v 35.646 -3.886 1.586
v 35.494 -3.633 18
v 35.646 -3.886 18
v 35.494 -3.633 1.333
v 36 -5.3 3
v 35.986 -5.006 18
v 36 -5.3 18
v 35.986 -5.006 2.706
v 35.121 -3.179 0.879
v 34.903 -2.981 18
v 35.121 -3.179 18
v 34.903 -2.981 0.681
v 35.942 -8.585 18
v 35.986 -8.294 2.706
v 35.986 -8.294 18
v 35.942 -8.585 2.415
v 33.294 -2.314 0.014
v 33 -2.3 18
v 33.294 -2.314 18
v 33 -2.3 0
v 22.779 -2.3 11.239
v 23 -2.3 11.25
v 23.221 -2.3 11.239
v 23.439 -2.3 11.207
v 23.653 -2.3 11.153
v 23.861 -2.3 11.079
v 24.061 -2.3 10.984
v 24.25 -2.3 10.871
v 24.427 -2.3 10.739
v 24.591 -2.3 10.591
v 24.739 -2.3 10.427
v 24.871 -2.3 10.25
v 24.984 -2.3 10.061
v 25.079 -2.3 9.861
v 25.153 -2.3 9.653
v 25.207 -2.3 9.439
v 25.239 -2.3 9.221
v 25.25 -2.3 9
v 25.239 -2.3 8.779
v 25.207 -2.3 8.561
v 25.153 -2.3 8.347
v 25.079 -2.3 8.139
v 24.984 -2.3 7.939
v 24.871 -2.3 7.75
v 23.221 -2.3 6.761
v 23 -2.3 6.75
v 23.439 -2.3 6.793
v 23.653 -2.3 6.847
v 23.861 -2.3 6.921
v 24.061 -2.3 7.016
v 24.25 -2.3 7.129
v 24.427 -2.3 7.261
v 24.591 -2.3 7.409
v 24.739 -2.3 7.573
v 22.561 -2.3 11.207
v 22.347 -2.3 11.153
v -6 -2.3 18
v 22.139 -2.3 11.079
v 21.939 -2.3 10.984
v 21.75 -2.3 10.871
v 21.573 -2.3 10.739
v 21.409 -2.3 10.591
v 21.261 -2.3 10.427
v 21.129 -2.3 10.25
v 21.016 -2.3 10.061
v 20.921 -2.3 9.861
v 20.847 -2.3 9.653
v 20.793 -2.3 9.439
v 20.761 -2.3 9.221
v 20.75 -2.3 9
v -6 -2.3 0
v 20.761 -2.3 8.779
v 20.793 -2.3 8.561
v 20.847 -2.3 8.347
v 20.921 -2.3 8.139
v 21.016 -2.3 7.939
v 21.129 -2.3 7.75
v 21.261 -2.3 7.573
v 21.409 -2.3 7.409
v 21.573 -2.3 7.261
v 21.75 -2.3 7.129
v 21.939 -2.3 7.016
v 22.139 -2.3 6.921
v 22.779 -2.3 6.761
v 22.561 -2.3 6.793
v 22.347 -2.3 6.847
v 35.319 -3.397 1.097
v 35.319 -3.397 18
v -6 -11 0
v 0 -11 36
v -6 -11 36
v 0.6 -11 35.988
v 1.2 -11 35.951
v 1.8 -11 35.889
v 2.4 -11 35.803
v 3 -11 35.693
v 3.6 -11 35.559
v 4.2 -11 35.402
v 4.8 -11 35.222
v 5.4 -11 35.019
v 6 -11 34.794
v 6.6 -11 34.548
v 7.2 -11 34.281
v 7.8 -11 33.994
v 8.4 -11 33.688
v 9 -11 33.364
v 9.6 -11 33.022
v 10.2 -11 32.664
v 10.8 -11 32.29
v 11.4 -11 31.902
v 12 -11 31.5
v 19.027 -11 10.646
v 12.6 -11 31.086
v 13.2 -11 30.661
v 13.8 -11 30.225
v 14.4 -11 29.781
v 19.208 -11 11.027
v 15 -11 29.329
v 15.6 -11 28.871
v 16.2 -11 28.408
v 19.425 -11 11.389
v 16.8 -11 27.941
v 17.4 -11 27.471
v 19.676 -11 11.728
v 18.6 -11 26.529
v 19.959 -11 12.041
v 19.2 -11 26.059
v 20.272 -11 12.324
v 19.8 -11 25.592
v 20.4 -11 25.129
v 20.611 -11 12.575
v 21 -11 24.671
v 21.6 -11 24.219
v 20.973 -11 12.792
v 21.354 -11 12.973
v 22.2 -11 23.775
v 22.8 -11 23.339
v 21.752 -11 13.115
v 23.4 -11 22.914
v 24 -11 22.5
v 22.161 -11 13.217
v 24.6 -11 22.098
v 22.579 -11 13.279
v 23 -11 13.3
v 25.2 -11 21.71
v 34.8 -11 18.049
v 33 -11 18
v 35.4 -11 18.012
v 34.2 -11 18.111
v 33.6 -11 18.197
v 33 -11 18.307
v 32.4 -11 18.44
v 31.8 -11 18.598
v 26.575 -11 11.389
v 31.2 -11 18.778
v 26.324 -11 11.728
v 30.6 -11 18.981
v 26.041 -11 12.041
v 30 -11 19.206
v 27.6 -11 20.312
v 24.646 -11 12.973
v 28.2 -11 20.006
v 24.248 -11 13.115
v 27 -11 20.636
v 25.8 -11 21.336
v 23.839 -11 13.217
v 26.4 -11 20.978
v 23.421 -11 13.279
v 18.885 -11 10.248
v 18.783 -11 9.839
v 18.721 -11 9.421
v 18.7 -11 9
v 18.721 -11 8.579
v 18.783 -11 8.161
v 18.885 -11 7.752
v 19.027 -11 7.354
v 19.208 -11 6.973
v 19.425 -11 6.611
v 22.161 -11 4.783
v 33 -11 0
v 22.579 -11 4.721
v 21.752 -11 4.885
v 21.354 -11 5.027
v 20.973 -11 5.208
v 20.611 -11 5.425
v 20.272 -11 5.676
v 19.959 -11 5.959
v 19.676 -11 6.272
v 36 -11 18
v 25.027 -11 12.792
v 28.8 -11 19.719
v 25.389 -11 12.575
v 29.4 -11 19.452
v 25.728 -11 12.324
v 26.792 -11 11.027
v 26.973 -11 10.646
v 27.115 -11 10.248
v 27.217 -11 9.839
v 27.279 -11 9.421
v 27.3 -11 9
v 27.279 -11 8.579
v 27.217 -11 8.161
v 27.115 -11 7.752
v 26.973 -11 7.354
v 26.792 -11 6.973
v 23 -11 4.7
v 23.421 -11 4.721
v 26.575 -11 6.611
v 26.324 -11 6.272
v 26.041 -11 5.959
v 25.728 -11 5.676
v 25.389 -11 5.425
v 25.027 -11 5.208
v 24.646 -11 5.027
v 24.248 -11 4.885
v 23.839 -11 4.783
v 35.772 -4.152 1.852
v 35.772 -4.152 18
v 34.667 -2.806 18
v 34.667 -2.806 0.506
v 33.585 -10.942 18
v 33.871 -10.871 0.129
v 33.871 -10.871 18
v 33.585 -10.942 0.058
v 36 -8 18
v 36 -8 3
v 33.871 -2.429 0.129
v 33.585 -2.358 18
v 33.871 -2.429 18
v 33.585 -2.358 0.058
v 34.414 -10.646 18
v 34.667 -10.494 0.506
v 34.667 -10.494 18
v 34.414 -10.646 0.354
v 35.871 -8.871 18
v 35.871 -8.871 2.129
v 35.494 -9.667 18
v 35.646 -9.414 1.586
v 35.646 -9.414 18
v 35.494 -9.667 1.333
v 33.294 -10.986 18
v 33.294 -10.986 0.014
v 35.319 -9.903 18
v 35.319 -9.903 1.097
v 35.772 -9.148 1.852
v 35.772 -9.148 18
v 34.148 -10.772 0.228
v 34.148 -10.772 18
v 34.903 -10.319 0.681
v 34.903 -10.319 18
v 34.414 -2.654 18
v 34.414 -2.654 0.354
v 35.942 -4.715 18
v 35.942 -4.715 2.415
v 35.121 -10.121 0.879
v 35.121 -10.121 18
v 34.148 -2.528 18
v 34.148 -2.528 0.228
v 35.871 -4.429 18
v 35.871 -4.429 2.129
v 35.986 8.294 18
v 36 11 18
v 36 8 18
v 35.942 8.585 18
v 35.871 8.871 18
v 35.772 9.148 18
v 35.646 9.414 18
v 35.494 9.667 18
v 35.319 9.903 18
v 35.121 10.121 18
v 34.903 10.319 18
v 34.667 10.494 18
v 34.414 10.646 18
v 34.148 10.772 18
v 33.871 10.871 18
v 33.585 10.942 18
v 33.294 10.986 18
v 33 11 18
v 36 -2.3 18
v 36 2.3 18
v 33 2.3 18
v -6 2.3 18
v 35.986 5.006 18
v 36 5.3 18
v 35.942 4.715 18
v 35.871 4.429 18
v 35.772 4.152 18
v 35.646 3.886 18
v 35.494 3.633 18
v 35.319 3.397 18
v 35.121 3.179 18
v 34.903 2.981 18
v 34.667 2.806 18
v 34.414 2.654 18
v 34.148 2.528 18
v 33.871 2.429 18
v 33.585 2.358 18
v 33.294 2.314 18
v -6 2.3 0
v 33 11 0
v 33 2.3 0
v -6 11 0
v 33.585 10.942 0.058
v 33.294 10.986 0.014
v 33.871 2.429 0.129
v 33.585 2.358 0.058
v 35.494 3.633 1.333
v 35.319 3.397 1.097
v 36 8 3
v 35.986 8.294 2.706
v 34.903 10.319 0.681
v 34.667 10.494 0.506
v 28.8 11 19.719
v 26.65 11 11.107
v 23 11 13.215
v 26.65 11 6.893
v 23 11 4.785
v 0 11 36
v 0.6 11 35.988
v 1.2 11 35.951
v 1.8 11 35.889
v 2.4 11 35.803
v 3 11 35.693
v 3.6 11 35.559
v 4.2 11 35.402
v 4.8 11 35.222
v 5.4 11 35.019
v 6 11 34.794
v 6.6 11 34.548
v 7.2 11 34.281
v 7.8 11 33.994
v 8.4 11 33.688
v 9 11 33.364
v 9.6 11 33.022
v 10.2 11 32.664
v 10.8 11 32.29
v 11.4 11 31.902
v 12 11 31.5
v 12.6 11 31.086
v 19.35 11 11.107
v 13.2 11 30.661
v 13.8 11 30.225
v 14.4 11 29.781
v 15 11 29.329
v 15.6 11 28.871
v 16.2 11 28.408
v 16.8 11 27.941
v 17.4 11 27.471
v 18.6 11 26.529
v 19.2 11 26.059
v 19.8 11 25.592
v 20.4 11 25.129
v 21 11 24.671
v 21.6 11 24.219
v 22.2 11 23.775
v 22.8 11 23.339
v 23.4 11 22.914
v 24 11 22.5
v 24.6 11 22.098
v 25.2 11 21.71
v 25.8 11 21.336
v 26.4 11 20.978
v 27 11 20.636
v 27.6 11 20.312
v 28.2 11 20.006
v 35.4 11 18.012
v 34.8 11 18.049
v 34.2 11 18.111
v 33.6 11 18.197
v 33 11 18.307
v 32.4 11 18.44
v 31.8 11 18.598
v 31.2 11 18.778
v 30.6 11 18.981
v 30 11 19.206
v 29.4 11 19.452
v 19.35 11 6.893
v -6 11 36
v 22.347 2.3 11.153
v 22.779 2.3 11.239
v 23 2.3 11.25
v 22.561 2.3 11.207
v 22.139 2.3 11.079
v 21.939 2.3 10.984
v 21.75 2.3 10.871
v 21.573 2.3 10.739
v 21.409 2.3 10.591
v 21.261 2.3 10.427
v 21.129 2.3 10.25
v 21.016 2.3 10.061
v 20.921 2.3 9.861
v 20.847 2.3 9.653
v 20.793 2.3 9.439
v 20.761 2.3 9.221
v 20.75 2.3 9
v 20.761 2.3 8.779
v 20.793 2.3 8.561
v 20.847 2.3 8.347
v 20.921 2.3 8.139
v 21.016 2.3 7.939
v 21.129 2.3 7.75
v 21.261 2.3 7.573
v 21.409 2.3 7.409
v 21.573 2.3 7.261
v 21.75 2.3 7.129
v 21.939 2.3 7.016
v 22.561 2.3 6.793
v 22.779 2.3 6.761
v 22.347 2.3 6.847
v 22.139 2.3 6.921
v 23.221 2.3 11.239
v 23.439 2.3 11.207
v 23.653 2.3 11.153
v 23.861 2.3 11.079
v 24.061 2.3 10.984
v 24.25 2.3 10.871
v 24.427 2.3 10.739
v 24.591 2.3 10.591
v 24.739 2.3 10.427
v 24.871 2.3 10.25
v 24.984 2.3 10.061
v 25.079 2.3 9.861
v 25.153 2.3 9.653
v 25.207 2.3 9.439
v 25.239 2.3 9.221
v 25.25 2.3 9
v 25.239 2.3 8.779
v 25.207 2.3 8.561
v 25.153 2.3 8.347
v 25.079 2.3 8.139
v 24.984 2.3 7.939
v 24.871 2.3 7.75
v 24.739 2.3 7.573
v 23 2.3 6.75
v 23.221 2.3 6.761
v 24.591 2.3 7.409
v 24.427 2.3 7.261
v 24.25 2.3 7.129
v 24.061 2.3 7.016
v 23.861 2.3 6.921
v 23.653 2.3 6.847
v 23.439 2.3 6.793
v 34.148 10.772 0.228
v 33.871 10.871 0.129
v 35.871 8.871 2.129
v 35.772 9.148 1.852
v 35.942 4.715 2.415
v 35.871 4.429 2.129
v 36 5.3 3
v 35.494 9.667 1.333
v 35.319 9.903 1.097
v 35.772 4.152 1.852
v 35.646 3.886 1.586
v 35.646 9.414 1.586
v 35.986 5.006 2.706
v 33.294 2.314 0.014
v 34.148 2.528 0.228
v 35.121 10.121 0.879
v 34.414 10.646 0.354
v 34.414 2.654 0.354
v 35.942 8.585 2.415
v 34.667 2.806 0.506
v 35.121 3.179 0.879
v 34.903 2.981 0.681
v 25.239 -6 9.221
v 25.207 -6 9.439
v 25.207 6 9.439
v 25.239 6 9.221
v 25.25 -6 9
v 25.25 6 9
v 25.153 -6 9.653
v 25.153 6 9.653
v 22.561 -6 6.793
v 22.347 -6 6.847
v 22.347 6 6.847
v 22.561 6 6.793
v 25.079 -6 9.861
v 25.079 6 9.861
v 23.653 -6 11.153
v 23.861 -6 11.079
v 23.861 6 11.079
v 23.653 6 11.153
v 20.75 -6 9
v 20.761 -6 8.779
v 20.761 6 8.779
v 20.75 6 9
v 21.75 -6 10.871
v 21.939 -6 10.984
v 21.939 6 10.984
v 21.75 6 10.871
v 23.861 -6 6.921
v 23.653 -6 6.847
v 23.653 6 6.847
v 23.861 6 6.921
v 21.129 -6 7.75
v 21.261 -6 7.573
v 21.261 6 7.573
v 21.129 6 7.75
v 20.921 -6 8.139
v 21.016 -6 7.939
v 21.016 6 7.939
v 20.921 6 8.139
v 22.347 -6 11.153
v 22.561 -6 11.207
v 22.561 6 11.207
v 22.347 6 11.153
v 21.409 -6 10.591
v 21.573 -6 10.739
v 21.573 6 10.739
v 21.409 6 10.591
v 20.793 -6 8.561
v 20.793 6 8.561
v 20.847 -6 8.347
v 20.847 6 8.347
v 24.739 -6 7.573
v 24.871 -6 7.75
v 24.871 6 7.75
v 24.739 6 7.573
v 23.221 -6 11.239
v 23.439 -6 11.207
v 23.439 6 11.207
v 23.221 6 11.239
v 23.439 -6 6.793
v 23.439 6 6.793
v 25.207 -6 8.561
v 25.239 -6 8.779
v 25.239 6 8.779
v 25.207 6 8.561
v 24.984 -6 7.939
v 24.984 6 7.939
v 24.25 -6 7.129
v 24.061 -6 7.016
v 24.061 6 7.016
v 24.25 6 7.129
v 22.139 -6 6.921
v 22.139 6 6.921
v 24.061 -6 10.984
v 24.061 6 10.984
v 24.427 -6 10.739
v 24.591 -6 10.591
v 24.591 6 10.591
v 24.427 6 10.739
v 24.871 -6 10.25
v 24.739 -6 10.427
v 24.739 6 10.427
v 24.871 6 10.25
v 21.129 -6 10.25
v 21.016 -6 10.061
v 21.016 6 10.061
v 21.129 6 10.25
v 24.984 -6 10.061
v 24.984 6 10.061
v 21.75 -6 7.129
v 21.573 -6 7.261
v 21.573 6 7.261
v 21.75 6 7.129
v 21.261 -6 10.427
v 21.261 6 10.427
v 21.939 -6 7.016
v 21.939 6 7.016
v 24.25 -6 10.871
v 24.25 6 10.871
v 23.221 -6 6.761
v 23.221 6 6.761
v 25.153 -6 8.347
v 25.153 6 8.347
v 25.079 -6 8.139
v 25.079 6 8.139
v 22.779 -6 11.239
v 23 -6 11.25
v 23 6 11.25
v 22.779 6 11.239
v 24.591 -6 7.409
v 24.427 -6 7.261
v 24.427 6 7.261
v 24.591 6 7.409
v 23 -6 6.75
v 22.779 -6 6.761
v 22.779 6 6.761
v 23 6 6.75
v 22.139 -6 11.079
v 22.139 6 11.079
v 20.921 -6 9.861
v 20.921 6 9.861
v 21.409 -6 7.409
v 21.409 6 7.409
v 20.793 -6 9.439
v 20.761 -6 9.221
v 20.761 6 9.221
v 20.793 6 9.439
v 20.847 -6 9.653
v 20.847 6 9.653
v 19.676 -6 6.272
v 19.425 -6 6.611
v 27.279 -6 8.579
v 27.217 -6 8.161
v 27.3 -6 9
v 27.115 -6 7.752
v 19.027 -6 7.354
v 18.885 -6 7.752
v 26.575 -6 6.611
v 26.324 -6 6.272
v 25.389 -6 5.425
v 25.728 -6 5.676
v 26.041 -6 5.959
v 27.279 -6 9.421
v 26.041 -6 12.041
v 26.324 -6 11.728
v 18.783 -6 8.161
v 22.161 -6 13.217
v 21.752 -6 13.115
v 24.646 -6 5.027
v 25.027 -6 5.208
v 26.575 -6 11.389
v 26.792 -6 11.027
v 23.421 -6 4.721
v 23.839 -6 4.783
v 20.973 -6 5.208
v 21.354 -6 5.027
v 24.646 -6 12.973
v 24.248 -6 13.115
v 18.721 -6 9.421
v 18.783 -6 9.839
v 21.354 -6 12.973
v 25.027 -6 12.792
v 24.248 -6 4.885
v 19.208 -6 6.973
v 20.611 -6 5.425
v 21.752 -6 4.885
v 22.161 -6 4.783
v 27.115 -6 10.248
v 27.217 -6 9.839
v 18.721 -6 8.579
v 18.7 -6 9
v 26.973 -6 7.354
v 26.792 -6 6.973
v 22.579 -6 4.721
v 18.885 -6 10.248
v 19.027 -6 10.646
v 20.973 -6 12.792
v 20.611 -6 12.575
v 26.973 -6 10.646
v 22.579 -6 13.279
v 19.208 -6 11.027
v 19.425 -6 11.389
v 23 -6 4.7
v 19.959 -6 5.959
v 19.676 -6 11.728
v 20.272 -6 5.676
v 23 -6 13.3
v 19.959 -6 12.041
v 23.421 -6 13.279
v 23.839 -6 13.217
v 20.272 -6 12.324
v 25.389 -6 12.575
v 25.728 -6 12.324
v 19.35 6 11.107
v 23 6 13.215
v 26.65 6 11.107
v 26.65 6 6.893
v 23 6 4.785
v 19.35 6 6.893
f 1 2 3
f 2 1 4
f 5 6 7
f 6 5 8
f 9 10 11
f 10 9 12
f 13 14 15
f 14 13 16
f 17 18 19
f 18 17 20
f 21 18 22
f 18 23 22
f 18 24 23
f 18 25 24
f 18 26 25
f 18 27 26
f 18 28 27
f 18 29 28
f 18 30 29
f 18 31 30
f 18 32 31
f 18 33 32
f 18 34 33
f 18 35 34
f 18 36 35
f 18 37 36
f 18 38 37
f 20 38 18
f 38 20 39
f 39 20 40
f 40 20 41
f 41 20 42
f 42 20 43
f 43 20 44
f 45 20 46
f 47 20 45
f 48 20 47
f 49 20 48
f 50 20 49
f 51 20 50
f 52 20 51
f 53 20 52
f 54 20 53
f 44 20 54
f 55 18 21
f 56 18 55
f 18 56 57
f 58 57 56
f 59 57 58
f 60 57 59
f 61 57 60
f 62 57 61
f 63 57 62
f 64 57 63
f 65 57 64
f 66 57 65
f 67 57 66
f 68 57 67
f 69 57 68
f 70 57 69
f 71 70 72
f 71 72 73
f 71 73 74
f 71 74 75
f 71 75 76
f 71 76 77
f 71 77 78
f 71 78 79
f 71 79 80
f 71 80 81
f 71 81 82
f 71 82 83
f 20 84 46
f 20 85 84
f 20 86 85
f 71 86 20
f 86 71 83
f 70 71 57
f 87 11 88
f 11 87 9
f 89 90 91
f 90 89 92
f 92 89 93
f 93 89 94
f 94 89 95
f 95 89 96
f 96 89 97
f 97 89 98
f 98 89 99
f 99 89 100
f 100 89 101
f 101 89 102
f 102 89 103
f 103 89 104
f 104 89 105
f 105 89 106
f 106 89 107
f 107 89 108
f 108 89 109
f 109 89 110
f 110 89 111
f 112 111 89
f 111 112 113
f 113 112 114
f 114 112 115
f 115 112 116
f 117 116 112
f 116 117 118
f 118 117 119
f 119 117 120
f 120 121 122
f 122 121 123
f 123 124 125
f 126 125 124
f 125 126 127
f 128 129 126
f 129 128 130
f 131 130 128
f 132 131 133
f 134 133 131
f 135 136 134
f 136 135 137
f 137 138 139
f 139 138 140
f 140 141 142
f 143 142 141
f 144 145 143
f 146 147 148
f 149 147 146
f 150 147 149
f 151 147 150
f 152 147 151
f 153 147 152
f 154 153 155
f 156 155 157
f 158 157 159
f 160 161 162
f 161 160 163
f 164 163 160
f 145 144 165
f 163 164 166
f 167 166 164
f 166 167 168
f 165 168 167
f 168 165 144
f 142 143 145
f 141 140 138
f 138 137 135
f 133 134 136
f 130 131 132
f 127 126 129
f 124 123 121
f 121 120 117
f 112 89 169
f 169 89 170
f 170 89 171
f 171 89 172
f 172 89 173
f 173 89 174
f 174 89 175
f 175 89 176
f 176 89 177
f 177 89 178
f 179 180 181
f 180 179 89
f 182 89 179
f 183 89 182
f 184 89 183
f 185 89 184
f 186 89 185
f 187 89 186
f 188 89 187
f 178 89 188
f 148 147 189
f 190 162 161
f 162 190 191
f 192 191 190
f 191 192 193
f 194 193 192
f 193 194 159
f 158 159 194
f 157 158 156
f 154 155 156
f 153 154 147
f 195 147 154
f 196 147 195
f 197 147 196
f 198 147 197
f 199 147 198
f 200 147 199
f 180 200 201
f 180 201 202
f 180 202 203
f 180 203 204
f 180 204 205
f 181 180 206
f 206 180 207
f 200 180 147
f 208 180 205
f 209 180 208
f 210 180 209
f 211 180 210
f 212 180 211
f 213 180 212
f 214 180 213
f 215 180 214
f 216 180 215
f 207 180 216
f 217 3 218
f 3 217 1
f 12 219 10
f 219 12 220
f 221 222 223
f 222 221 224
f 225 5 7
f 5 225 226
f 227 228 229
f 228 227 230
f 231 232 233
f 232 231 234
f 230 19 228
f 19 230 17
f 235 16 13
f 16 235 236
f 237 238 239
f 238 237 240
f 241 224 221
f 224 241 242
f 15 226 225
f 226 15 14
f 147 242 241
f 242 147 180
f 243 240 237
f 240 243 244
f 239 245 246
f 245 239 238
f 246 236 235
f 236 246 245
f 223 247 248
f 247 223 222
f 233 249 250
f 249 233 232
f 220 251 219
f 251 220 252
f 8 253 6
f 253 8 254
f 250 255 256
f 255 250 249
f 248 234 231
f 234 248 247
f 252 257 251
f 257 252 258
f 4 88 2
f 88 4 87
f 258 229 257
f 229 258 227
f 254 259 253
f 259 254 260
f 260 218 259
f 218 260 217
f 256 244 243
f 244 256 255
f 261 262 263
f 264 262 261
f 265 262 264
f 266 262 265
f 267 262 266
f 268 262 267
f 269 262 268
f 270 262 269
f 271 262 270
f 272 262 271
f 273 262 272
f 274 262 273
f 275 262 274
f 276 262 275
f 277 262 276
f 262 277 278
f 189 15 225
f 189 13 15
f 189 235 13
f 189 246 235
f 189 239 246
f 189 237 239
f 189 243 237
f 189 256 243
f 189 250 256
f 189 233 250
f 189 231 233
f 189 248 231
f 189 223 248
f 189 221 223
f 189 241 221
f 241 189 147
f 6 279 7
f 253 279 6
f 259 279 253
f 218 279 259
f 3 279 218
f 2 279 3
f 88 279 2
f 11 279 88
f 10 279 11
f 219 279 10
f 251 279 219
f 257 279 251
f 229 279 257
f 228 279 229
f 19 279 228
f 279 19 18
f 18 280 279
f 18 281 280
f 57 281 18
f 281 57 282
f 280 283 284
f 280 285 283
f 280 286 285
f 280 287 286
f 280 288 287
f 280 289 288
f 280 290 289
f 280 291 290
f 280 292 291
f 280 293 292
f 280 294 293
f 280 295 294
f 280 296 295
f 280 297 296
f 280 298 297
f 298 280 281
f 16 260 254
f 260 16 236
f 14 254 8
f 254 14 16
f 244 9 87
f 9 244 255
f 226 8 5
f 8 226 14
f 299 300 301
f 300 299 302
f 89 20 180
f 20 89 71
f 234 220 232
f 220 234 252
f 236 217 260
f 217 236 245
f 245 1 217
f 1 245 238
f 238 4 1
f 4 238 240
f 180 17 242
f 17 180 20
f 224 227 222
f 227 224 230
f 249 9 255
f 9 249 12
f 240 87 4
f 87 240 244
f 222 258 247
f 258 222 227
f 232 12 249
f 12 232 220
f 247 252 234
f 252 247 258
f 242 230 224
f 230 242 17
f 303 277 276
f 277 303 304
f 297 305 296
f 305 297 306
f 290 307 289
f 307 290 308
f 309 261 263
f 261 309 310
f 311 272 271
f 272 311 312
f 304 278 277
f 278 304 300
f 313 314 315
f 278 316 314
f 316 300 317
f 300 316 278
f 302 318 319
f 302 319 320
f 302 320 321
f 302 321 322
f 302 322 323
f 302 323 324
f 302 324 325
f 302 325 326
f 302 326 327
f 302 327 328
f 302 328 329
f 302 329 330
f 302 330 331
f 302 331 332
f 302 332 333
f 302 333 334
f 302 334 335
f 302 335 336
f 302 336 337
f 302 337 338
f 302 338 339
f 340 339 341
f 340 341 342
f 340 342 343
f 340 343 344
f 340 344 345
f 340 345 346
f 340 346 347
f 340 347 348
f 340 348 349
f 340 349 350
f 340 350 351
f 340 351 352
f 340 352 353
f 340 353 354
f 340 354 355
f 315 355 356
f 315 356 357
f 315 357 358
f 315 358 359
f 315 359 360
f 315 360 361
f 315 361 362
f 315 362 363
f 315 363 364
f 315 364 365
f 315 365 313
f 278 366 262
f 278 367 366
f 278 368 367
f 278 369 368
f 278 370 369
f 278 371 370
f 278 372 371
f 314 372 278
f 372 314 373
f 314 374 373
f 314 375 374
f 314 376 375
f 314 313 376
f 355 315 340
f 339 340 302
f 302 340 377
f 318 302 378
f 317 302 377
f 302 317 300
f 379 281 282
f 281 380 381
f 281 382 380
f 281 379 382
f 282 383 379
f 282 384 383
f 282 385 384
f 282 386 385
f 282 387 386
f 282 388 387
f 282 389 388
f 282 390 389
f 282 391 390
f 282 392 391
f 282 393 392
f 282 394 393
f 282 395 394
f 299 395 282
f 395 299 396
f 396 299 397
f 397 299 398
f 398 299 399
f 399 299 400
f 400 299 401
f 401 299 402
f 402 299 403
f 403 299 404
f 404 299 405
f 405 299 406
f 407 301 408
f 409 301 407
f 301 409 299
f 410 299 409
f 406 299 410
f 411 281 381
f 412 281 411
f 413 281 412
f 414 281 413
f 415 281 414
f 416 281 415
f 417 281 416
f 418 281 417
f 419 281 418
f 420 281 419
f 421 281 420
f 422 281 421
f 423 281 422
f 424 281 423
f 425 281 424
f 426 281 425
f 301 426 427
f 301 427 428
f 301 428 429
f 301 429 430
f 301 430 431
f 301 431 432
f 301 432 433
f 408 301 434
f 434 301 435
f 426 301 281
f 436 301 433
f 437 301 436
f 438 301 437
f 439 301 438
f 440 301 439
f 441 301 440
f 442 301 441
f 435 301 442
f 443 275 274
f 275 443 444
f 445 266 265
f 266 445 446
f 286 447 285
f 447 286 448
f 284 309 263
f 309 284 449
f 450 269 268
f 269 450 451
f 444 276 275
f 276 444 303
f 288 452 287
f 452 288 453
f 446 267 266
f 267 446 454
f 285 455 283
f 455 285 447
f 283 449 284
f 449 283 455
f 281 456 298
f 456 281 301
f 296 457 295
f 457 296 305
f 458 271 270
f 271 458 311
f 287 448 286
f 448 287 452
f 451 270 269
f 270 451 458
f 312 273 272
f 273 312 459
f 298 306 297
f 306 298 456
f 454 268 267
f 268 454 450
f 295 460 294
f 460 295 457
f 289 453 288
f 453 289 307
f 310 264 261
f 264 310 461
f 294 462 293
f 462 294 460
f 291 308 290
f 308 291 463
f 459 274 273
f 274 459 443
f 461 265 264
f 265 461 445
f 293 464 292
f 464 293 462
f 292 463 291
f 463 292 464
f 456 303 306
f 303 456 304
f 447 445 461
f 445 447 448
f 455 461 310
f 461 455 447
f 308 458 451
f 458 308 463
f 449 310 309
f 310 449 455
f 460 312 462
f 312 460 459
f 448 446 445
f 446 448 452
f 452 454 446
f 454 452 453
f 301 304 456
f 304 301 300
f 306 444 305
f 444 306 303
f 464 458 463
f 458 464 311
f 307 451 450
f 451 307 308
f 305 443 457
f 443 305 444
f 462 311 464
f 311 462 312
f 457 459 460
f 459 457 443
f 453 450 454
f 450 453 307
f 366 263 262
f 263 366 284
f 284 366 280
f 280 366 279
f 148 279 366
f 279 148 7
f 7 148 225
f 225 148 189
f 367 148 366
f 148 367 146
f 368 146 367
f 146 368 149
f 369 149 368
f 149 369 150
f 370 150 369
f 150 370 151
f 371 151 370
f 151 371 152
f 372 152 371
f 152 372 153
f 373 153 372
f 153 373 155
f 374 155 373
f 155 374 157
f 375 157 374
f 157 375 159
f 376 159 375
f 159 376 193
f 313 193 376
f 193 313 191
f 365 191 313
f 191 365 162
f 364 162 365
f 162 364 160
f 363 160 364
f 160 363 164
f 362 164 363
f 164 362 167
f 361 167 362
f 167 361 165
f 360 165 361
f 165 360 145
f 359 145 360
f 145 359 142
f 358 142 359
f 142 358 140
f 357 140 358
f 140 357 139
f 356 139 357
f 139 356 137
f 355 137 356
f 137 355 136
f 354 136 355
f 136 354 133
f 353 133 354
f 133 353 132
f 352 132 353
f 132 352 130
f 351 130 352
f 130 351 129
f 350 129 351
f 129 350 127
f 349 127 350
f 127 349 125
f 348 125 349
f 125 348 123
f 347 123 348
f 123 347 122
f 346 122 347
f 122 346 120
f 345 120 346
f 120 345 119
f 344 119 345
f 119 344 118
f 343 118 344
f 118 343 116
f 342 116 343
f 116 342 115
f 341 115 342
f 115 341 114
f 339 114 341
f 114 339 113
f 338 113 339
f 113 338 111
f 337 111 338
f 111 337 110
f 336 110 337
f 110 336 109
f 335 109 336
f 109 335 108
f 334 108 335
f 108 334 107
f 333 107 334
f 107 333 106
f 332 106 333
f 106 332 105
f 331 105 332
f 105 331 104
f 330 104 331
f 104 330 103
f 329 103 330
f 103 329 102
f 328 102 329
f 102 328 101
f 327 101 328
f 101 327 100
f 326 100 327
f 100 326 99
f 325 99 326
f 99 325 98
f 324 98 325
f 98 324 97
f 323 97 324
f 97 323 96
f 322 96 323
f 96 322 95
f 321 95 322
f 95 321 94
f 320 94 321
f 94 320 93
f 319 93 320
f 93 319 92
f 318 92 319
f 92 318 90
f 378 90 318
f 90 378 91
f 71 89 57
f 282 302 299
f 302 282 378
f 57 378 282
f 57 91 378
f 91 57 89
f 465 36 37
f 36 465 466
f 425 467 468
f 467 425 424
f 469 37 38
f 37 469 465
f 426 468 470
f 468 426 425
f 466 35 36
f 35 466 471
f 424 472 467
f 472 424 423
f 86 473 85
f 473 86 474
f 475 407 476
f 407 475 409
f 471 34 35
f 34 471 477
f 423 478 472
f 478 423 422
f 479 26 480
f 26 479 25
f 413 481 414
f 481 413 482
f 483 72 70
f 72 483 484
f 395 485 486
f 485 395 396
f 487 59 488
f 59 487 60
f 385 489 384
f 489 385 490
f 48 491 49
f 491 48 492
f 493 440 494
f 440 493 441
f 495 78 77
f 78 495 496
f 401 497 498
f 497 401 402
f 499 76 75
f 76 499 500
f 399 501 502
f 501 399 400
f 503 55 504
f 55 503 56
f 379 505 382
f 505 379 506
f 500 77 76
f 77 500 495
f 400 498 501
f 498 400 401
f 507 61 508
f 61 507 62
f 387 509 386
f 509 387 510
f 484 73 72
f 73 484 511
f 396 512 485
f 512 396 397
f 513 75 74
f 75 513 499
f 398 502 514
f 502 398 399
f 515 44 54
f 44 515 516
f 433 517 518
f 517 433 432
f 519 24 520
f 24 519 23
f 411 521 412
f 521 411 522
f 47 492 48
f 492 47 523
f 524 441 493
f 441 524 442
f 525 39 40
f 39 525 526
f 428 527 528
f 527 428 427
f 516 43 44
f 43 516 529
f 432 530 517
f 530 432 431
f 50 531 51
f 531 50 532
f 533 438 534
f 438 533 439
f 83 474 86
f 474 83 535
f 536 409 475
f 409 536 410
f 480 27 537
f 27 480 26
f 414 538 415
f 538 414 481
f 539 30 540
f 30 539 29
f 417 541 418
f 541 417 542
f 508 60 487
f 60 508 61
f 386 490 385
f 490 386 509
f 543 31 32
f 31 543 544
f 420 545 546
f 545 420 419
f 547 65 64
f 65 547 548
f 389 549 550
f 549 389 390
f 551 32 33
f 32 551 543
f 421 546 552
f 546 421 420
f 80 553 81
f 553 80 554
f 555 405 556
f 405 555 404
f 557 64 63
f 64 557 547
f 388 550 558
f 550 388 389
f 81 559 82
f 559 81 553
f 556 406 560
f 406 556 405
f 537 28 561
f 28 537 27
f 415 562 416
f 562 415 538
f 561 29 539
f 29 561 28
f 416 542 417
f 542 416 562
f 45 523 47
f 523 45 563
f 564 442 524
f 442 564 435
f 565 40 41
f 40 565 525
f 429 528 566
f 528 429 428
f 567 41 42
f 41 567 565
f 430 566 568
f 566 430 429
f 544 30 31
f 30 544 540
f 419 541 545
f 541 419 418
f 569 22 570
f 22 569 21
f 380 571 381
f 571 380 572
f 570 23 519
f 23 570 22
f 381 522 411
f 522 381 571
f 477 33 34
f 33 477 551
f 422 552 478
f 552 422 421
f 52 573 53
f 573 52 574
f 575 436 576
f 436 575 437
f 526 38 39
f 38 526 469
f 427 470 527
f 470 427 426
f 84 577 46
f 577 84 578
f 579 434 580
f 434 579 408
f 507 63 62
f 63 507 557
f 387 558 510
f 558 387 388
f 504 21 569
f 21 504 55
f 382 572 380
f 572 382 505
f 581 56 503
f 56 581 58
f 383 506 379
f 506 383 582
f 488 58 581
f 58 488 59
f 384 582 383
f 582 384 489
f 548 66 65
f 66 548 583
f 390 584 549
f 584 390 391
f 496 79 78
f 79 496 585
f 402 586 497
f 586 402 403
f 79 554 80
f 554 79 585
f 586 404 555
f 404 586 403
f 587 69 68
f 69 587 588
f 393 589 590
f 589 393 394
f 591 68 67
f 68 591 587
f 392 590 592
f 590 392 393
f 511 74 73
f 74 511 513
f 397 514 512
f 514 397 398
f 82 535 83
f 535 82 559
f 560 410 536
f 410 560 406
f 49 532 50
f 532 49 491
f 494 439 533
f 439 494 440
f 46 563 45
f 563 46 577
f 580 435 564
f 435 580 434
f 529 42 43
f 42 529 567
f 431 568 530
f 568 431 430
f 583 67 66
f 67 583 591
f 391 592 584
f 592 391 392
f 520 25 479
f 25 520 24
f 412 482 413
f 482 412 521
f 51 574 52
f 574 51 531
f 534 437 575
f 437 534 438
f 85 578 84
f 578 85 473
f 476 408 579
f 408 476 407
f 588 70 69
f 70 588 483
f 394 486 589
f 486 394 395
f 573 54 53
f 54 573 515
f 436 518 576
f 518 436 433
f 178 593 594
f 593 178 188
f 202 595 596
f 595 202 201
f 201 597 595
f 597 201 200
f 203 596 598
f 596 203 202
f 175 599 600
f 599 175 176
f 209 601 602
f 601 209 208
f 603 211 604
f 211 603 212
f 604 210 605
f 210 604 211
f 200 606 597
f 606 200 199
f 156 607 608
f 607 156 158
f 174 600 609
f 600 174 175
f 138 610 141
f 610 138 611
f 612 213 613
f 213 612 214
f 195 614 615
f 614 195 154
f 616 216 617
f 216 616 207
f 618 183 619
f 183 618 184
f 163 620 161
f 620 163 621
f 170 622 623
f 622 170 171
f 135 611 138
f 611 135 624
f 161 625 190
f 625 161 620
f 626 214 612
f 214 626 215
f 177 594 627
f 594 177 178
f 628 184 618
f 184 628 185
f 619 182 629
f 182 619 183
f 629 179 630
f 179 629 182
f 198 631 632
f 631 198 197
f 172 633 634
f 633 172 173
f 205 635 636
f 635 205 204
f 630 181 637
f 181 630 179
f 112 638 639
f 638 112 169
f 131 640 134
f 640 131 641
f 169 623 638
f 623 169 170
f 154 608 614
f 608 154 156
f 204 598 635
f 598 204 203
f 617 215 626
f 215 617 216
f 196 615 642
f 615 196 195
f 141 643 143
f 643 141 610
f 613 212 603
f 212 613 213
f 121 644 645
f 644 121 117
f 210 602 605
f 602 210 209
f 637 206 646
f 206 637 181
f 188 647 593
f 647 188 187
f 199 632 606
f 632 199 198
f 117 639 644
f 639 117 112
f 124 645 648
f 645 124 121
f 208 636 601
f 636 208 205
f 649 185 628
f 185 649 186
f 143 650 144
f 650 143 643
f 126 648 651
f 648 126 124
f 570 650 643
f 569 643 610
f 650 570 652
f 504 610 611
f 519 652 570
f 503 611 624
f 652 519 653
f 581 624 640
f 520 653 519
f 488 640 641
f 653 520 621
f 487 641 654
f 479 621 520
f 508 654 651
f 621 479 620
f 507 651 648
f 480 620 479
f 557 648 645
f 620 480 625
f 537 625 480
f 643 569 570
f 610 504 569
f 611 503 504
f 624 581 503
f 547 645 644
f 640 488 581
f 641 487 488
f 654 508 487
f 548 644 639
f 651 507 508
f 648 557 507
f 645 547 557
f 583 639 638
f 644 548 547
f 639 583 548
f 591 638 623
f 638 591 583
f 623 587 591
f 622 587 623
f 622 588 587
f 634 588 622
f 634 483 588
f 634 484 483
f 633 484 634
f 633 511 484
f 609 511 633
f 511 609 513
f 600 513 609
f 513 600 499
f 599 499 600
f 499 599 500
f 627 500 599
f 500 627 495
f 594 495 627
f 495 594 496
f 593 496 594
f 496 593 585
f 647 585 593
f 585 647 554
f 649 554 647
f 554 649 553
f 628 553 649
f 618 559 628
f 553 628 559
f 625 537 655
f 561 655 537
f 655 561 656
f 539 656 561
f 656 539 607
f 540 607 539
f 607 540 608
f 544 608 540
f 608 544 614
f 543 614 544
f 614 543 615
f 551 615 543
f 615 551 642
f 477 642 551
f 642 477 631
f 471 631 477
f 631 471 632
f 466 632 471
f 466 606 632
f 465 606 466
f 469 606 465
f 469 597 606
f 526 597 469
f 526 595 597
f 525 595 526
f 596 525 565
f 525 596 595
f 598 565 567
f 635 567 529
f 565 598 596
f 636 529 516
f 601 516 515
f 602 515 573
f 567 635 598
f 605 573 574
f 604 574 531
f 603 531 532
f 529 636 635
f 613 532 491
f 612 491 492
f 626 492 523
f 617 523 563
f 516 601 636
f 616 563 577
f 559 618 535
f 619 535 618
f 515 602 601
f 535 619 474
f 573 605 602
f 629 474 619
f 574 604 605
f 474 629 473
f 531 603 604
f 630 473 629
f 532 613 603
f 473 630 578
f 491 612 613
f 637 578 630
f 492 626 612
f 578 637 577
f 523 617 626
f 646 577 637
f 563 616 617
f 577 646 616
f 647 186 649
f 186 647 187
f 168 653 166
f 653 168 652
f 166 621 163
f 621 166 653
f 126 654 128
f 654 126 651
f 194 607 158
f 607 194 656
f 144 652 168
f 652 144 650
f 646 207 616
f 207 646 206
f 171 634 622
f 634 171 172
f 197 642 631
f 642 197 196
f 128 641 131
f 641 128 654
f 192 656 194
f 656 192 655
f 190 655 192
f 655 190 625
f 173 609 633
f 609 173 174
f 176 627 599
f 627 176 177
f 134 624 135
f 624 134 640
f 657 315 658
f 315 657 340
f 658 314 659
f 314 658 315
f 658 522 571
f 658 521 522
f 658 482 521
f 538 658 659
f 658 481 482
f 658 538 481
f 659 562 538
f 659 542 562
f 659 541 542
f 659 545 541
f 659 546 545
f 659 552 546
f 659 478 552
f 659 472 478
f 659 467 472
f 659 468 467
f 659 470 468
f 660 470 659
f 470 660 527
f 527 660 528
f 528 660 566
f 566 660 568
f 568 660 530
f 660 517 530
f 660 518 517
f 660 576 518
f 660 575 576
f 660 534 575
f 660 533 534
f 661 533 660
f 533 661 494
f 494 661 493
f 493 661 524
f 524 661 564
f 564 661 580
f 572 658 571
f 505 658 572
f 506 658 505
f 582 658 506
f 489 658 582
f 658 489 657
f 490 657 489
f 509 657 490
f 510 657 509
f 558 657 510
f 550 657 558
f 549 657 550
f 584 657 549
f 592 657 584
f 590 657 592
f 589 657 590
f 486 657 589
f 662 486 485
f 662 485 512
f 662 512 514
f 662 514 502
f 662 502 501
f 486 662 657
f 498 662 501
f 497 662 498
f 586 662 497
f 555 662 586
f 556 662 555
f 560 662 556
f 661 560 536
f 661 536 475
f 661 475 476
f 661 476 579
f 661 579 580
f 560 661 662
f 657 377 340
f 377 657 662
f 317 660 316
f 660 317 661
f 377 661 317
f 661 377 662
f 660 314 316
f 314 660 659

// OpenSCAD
// Batente v6 para a ponta do suporte das cadeiras (OpenSCAD)
// Eixos: X ao longo do suporte (X=0 na ponta, cresce para dentro do suporte),
//        Y na largura (centrado), Z para cima (Z=0 no fundo do canal).
// Medidas em mm. Parafuso M4 x 16 + porca M4. Cavidades com o formato exato.
// O suporte nao tem paredes externas: a peca tem 22 mm de largura em todos os pontos.
// v6: sulco central passa de ponta a ponta (inclusive pela parede), 1 mm mais largo, e ponta das garras arredondada.

$fn = 64;

// ---------- Medidas do suporte ----------
LARG      = 22;     // largura total (tambem a largura da peca)
DIV       = 3;      // divisao do meio
ALT_CANAL = 18;     // altura do canal
FURO_X    = 23;     // centro do furo de 5 mm, a partir da ponta

// ---------- Parametros da peca ----------
FOLGA      = 0.3;   // folga de encaixe para impressao 3D
ESP_PAREDE = 6;     // espessura da parede na ponta (X de -6 a 0)
ALT_PAREDE = 18;    // altura da parede acima do canal
COMP_GARRA = 36;    // comprimento das garras dentro dos canais
FOLGA_SULCO = 0.5;  // folga extra de cada lado do sulco (sulco 1 mm mais largo)
R_PONTA    = 3;     // raio do arredondamento da ponta das garras

// ---------- Parafuso M4 x 16 e porca M4 ----------
FURO_D     = 4.5;   // furo passante M4
CABECA_D   = 8.6;   // cabeca panela M4 (8,0) + folga
CABECA_PROF = 5.0;  // cabeca panela (3,1) ou cilindrica (4,0) fica rebaixada
PORCA_AF   = 7.3;   // porca M4: 7,0 entre faces + folga
PORCA_PROF = 5.0;   // porca M4 (3,2) encostada no fundo; M4x16 atravessa a porca inteira

// ---------- Derivados ----------
VAO        = DIV + 2*FOLGA + 2*FOLGA_SULCO; // sulco central onde passa a divisao (4,6 mm)
LARG_GARRA = (LARG - VAO) / 2;          // cada garra vai da borda de 22 mm ate o vao
Y_CENTRO   = VAO/2 + LARG_GARRA/2;      // centro de cada garra
Y_EXT      = LARG/2;                    // face externa da garra (|Y| = 11)
Z_FURO     = ALT_CANAL/2;
R_PORCA    = PORCA_AF / sqrt(3);        // raio circunscrito do sextavado
TOPO       = ALT_CANAL + ALT_PAREDE;

// ---------- Perfil lateral: parede + rampa que termina rente ao topo do canal ----------
N = 60;
rampa = [ for (i = [0:N]) let(t = i/N)
          [ COMP_GARRA*t, ALT_CANAL + ALT_PAREDE*0.5*(1 + cos(180*t)) ] ];
perfil = concat([[-ESP_PAREDE, 0], [-ESP_PAREDE, TOPO]],
                rampa,
                [[COMP_GARRA, ALT_CANAL], [0, ALT_CANAL], [0, 0]]);

module cabeca() {
    // perfil em XZ extrudado ao longo de Y, centrado
    rotate([90, 0, 0]) linear_extrude(height = LARG, center = true) polygon(perfil);
}

module garra(y0, y1) {
    // garra entre y0 e y1; a ponta (X = COMP_GARRA) e arredondada
    L = COMP_GARRA; R = R_PONTA;
    intersection() {
        // arredondamento em planta (cantos verticais da ponta)
        translate([0, 0, -1]) linear_extrude(height = ALT_CANAL + 2) hull() {
            translate([-0.5, y0]) square([L - R + 0.5, y1 - y0]);
            translate([L - R, y0 + R]) circle(r = R);
            translate([L - R, y1 - R]) circle(r = R);
        }
        // arredondamento em elevacao (aresta de baixo da ponta)
        rotate([90, 0, 0]) linear_extrude(height = LARG + 2, center = true) hull() {
            translate([-0.5, 0]) square([L - R + 0.5, ALT_CANAL]);
            translate([L - R, R]) circle(r = R);
            translate([L - R, ALT_CANAL - 0.01]) square([R, 0.01]);
        }
    }
}

module garras() {
    // duas garras que somam 22 mm de largura, com o sulco no meio
    garra(-Y_EXT, -VAO/2);
    garra(VAO/2, Y_EXT);
}

module sulco_passante() {
    // sulco central de ponta a ponta: atravessa tambem a parede da ponta
    translate([-ESP_PAREDE - 1, -VAO/2, -1])
        cube([ESP_PAREDE + COMP_GARRA + 2, VAO, ALT_CANAL + 1]);
}

module furo_parafuso() {
    translate([FURO_X, 0, Z_FURO]) rotate([90, 0, 0])
        cylinder(d = FURO_D, h = LARG + 4, center = true);
}

module rebaixo_cabeca() {   // cilindro exato, no lado -Y
    translate([FURO_X, -Y_EXT - 0.01, Z_FURO]) rotate([-90, 0, 0])
        cylinder(d = CABECA_D, h = CABECA_PROF + 0.01);
}

module sextavado_porca() {  // sextavado exato, no lado +Y
    translate([FURO_X, Y_EXT + 0.01, Z_FURO]) rotate([90, 0, 0])
        rotate([0, 0, 30])  // cantos para cima/baixo, faces planas nas laterais
            cylinder(r = R_PORCA, h = PORCA_PROF + 0.01, $fn = 6);
}

difference() {
    union() { cabeca(); garras(); }
    sulco_passante();
    furo_parafuso();
    rebaixo_cabeca();
    sextavado_porca();
}
